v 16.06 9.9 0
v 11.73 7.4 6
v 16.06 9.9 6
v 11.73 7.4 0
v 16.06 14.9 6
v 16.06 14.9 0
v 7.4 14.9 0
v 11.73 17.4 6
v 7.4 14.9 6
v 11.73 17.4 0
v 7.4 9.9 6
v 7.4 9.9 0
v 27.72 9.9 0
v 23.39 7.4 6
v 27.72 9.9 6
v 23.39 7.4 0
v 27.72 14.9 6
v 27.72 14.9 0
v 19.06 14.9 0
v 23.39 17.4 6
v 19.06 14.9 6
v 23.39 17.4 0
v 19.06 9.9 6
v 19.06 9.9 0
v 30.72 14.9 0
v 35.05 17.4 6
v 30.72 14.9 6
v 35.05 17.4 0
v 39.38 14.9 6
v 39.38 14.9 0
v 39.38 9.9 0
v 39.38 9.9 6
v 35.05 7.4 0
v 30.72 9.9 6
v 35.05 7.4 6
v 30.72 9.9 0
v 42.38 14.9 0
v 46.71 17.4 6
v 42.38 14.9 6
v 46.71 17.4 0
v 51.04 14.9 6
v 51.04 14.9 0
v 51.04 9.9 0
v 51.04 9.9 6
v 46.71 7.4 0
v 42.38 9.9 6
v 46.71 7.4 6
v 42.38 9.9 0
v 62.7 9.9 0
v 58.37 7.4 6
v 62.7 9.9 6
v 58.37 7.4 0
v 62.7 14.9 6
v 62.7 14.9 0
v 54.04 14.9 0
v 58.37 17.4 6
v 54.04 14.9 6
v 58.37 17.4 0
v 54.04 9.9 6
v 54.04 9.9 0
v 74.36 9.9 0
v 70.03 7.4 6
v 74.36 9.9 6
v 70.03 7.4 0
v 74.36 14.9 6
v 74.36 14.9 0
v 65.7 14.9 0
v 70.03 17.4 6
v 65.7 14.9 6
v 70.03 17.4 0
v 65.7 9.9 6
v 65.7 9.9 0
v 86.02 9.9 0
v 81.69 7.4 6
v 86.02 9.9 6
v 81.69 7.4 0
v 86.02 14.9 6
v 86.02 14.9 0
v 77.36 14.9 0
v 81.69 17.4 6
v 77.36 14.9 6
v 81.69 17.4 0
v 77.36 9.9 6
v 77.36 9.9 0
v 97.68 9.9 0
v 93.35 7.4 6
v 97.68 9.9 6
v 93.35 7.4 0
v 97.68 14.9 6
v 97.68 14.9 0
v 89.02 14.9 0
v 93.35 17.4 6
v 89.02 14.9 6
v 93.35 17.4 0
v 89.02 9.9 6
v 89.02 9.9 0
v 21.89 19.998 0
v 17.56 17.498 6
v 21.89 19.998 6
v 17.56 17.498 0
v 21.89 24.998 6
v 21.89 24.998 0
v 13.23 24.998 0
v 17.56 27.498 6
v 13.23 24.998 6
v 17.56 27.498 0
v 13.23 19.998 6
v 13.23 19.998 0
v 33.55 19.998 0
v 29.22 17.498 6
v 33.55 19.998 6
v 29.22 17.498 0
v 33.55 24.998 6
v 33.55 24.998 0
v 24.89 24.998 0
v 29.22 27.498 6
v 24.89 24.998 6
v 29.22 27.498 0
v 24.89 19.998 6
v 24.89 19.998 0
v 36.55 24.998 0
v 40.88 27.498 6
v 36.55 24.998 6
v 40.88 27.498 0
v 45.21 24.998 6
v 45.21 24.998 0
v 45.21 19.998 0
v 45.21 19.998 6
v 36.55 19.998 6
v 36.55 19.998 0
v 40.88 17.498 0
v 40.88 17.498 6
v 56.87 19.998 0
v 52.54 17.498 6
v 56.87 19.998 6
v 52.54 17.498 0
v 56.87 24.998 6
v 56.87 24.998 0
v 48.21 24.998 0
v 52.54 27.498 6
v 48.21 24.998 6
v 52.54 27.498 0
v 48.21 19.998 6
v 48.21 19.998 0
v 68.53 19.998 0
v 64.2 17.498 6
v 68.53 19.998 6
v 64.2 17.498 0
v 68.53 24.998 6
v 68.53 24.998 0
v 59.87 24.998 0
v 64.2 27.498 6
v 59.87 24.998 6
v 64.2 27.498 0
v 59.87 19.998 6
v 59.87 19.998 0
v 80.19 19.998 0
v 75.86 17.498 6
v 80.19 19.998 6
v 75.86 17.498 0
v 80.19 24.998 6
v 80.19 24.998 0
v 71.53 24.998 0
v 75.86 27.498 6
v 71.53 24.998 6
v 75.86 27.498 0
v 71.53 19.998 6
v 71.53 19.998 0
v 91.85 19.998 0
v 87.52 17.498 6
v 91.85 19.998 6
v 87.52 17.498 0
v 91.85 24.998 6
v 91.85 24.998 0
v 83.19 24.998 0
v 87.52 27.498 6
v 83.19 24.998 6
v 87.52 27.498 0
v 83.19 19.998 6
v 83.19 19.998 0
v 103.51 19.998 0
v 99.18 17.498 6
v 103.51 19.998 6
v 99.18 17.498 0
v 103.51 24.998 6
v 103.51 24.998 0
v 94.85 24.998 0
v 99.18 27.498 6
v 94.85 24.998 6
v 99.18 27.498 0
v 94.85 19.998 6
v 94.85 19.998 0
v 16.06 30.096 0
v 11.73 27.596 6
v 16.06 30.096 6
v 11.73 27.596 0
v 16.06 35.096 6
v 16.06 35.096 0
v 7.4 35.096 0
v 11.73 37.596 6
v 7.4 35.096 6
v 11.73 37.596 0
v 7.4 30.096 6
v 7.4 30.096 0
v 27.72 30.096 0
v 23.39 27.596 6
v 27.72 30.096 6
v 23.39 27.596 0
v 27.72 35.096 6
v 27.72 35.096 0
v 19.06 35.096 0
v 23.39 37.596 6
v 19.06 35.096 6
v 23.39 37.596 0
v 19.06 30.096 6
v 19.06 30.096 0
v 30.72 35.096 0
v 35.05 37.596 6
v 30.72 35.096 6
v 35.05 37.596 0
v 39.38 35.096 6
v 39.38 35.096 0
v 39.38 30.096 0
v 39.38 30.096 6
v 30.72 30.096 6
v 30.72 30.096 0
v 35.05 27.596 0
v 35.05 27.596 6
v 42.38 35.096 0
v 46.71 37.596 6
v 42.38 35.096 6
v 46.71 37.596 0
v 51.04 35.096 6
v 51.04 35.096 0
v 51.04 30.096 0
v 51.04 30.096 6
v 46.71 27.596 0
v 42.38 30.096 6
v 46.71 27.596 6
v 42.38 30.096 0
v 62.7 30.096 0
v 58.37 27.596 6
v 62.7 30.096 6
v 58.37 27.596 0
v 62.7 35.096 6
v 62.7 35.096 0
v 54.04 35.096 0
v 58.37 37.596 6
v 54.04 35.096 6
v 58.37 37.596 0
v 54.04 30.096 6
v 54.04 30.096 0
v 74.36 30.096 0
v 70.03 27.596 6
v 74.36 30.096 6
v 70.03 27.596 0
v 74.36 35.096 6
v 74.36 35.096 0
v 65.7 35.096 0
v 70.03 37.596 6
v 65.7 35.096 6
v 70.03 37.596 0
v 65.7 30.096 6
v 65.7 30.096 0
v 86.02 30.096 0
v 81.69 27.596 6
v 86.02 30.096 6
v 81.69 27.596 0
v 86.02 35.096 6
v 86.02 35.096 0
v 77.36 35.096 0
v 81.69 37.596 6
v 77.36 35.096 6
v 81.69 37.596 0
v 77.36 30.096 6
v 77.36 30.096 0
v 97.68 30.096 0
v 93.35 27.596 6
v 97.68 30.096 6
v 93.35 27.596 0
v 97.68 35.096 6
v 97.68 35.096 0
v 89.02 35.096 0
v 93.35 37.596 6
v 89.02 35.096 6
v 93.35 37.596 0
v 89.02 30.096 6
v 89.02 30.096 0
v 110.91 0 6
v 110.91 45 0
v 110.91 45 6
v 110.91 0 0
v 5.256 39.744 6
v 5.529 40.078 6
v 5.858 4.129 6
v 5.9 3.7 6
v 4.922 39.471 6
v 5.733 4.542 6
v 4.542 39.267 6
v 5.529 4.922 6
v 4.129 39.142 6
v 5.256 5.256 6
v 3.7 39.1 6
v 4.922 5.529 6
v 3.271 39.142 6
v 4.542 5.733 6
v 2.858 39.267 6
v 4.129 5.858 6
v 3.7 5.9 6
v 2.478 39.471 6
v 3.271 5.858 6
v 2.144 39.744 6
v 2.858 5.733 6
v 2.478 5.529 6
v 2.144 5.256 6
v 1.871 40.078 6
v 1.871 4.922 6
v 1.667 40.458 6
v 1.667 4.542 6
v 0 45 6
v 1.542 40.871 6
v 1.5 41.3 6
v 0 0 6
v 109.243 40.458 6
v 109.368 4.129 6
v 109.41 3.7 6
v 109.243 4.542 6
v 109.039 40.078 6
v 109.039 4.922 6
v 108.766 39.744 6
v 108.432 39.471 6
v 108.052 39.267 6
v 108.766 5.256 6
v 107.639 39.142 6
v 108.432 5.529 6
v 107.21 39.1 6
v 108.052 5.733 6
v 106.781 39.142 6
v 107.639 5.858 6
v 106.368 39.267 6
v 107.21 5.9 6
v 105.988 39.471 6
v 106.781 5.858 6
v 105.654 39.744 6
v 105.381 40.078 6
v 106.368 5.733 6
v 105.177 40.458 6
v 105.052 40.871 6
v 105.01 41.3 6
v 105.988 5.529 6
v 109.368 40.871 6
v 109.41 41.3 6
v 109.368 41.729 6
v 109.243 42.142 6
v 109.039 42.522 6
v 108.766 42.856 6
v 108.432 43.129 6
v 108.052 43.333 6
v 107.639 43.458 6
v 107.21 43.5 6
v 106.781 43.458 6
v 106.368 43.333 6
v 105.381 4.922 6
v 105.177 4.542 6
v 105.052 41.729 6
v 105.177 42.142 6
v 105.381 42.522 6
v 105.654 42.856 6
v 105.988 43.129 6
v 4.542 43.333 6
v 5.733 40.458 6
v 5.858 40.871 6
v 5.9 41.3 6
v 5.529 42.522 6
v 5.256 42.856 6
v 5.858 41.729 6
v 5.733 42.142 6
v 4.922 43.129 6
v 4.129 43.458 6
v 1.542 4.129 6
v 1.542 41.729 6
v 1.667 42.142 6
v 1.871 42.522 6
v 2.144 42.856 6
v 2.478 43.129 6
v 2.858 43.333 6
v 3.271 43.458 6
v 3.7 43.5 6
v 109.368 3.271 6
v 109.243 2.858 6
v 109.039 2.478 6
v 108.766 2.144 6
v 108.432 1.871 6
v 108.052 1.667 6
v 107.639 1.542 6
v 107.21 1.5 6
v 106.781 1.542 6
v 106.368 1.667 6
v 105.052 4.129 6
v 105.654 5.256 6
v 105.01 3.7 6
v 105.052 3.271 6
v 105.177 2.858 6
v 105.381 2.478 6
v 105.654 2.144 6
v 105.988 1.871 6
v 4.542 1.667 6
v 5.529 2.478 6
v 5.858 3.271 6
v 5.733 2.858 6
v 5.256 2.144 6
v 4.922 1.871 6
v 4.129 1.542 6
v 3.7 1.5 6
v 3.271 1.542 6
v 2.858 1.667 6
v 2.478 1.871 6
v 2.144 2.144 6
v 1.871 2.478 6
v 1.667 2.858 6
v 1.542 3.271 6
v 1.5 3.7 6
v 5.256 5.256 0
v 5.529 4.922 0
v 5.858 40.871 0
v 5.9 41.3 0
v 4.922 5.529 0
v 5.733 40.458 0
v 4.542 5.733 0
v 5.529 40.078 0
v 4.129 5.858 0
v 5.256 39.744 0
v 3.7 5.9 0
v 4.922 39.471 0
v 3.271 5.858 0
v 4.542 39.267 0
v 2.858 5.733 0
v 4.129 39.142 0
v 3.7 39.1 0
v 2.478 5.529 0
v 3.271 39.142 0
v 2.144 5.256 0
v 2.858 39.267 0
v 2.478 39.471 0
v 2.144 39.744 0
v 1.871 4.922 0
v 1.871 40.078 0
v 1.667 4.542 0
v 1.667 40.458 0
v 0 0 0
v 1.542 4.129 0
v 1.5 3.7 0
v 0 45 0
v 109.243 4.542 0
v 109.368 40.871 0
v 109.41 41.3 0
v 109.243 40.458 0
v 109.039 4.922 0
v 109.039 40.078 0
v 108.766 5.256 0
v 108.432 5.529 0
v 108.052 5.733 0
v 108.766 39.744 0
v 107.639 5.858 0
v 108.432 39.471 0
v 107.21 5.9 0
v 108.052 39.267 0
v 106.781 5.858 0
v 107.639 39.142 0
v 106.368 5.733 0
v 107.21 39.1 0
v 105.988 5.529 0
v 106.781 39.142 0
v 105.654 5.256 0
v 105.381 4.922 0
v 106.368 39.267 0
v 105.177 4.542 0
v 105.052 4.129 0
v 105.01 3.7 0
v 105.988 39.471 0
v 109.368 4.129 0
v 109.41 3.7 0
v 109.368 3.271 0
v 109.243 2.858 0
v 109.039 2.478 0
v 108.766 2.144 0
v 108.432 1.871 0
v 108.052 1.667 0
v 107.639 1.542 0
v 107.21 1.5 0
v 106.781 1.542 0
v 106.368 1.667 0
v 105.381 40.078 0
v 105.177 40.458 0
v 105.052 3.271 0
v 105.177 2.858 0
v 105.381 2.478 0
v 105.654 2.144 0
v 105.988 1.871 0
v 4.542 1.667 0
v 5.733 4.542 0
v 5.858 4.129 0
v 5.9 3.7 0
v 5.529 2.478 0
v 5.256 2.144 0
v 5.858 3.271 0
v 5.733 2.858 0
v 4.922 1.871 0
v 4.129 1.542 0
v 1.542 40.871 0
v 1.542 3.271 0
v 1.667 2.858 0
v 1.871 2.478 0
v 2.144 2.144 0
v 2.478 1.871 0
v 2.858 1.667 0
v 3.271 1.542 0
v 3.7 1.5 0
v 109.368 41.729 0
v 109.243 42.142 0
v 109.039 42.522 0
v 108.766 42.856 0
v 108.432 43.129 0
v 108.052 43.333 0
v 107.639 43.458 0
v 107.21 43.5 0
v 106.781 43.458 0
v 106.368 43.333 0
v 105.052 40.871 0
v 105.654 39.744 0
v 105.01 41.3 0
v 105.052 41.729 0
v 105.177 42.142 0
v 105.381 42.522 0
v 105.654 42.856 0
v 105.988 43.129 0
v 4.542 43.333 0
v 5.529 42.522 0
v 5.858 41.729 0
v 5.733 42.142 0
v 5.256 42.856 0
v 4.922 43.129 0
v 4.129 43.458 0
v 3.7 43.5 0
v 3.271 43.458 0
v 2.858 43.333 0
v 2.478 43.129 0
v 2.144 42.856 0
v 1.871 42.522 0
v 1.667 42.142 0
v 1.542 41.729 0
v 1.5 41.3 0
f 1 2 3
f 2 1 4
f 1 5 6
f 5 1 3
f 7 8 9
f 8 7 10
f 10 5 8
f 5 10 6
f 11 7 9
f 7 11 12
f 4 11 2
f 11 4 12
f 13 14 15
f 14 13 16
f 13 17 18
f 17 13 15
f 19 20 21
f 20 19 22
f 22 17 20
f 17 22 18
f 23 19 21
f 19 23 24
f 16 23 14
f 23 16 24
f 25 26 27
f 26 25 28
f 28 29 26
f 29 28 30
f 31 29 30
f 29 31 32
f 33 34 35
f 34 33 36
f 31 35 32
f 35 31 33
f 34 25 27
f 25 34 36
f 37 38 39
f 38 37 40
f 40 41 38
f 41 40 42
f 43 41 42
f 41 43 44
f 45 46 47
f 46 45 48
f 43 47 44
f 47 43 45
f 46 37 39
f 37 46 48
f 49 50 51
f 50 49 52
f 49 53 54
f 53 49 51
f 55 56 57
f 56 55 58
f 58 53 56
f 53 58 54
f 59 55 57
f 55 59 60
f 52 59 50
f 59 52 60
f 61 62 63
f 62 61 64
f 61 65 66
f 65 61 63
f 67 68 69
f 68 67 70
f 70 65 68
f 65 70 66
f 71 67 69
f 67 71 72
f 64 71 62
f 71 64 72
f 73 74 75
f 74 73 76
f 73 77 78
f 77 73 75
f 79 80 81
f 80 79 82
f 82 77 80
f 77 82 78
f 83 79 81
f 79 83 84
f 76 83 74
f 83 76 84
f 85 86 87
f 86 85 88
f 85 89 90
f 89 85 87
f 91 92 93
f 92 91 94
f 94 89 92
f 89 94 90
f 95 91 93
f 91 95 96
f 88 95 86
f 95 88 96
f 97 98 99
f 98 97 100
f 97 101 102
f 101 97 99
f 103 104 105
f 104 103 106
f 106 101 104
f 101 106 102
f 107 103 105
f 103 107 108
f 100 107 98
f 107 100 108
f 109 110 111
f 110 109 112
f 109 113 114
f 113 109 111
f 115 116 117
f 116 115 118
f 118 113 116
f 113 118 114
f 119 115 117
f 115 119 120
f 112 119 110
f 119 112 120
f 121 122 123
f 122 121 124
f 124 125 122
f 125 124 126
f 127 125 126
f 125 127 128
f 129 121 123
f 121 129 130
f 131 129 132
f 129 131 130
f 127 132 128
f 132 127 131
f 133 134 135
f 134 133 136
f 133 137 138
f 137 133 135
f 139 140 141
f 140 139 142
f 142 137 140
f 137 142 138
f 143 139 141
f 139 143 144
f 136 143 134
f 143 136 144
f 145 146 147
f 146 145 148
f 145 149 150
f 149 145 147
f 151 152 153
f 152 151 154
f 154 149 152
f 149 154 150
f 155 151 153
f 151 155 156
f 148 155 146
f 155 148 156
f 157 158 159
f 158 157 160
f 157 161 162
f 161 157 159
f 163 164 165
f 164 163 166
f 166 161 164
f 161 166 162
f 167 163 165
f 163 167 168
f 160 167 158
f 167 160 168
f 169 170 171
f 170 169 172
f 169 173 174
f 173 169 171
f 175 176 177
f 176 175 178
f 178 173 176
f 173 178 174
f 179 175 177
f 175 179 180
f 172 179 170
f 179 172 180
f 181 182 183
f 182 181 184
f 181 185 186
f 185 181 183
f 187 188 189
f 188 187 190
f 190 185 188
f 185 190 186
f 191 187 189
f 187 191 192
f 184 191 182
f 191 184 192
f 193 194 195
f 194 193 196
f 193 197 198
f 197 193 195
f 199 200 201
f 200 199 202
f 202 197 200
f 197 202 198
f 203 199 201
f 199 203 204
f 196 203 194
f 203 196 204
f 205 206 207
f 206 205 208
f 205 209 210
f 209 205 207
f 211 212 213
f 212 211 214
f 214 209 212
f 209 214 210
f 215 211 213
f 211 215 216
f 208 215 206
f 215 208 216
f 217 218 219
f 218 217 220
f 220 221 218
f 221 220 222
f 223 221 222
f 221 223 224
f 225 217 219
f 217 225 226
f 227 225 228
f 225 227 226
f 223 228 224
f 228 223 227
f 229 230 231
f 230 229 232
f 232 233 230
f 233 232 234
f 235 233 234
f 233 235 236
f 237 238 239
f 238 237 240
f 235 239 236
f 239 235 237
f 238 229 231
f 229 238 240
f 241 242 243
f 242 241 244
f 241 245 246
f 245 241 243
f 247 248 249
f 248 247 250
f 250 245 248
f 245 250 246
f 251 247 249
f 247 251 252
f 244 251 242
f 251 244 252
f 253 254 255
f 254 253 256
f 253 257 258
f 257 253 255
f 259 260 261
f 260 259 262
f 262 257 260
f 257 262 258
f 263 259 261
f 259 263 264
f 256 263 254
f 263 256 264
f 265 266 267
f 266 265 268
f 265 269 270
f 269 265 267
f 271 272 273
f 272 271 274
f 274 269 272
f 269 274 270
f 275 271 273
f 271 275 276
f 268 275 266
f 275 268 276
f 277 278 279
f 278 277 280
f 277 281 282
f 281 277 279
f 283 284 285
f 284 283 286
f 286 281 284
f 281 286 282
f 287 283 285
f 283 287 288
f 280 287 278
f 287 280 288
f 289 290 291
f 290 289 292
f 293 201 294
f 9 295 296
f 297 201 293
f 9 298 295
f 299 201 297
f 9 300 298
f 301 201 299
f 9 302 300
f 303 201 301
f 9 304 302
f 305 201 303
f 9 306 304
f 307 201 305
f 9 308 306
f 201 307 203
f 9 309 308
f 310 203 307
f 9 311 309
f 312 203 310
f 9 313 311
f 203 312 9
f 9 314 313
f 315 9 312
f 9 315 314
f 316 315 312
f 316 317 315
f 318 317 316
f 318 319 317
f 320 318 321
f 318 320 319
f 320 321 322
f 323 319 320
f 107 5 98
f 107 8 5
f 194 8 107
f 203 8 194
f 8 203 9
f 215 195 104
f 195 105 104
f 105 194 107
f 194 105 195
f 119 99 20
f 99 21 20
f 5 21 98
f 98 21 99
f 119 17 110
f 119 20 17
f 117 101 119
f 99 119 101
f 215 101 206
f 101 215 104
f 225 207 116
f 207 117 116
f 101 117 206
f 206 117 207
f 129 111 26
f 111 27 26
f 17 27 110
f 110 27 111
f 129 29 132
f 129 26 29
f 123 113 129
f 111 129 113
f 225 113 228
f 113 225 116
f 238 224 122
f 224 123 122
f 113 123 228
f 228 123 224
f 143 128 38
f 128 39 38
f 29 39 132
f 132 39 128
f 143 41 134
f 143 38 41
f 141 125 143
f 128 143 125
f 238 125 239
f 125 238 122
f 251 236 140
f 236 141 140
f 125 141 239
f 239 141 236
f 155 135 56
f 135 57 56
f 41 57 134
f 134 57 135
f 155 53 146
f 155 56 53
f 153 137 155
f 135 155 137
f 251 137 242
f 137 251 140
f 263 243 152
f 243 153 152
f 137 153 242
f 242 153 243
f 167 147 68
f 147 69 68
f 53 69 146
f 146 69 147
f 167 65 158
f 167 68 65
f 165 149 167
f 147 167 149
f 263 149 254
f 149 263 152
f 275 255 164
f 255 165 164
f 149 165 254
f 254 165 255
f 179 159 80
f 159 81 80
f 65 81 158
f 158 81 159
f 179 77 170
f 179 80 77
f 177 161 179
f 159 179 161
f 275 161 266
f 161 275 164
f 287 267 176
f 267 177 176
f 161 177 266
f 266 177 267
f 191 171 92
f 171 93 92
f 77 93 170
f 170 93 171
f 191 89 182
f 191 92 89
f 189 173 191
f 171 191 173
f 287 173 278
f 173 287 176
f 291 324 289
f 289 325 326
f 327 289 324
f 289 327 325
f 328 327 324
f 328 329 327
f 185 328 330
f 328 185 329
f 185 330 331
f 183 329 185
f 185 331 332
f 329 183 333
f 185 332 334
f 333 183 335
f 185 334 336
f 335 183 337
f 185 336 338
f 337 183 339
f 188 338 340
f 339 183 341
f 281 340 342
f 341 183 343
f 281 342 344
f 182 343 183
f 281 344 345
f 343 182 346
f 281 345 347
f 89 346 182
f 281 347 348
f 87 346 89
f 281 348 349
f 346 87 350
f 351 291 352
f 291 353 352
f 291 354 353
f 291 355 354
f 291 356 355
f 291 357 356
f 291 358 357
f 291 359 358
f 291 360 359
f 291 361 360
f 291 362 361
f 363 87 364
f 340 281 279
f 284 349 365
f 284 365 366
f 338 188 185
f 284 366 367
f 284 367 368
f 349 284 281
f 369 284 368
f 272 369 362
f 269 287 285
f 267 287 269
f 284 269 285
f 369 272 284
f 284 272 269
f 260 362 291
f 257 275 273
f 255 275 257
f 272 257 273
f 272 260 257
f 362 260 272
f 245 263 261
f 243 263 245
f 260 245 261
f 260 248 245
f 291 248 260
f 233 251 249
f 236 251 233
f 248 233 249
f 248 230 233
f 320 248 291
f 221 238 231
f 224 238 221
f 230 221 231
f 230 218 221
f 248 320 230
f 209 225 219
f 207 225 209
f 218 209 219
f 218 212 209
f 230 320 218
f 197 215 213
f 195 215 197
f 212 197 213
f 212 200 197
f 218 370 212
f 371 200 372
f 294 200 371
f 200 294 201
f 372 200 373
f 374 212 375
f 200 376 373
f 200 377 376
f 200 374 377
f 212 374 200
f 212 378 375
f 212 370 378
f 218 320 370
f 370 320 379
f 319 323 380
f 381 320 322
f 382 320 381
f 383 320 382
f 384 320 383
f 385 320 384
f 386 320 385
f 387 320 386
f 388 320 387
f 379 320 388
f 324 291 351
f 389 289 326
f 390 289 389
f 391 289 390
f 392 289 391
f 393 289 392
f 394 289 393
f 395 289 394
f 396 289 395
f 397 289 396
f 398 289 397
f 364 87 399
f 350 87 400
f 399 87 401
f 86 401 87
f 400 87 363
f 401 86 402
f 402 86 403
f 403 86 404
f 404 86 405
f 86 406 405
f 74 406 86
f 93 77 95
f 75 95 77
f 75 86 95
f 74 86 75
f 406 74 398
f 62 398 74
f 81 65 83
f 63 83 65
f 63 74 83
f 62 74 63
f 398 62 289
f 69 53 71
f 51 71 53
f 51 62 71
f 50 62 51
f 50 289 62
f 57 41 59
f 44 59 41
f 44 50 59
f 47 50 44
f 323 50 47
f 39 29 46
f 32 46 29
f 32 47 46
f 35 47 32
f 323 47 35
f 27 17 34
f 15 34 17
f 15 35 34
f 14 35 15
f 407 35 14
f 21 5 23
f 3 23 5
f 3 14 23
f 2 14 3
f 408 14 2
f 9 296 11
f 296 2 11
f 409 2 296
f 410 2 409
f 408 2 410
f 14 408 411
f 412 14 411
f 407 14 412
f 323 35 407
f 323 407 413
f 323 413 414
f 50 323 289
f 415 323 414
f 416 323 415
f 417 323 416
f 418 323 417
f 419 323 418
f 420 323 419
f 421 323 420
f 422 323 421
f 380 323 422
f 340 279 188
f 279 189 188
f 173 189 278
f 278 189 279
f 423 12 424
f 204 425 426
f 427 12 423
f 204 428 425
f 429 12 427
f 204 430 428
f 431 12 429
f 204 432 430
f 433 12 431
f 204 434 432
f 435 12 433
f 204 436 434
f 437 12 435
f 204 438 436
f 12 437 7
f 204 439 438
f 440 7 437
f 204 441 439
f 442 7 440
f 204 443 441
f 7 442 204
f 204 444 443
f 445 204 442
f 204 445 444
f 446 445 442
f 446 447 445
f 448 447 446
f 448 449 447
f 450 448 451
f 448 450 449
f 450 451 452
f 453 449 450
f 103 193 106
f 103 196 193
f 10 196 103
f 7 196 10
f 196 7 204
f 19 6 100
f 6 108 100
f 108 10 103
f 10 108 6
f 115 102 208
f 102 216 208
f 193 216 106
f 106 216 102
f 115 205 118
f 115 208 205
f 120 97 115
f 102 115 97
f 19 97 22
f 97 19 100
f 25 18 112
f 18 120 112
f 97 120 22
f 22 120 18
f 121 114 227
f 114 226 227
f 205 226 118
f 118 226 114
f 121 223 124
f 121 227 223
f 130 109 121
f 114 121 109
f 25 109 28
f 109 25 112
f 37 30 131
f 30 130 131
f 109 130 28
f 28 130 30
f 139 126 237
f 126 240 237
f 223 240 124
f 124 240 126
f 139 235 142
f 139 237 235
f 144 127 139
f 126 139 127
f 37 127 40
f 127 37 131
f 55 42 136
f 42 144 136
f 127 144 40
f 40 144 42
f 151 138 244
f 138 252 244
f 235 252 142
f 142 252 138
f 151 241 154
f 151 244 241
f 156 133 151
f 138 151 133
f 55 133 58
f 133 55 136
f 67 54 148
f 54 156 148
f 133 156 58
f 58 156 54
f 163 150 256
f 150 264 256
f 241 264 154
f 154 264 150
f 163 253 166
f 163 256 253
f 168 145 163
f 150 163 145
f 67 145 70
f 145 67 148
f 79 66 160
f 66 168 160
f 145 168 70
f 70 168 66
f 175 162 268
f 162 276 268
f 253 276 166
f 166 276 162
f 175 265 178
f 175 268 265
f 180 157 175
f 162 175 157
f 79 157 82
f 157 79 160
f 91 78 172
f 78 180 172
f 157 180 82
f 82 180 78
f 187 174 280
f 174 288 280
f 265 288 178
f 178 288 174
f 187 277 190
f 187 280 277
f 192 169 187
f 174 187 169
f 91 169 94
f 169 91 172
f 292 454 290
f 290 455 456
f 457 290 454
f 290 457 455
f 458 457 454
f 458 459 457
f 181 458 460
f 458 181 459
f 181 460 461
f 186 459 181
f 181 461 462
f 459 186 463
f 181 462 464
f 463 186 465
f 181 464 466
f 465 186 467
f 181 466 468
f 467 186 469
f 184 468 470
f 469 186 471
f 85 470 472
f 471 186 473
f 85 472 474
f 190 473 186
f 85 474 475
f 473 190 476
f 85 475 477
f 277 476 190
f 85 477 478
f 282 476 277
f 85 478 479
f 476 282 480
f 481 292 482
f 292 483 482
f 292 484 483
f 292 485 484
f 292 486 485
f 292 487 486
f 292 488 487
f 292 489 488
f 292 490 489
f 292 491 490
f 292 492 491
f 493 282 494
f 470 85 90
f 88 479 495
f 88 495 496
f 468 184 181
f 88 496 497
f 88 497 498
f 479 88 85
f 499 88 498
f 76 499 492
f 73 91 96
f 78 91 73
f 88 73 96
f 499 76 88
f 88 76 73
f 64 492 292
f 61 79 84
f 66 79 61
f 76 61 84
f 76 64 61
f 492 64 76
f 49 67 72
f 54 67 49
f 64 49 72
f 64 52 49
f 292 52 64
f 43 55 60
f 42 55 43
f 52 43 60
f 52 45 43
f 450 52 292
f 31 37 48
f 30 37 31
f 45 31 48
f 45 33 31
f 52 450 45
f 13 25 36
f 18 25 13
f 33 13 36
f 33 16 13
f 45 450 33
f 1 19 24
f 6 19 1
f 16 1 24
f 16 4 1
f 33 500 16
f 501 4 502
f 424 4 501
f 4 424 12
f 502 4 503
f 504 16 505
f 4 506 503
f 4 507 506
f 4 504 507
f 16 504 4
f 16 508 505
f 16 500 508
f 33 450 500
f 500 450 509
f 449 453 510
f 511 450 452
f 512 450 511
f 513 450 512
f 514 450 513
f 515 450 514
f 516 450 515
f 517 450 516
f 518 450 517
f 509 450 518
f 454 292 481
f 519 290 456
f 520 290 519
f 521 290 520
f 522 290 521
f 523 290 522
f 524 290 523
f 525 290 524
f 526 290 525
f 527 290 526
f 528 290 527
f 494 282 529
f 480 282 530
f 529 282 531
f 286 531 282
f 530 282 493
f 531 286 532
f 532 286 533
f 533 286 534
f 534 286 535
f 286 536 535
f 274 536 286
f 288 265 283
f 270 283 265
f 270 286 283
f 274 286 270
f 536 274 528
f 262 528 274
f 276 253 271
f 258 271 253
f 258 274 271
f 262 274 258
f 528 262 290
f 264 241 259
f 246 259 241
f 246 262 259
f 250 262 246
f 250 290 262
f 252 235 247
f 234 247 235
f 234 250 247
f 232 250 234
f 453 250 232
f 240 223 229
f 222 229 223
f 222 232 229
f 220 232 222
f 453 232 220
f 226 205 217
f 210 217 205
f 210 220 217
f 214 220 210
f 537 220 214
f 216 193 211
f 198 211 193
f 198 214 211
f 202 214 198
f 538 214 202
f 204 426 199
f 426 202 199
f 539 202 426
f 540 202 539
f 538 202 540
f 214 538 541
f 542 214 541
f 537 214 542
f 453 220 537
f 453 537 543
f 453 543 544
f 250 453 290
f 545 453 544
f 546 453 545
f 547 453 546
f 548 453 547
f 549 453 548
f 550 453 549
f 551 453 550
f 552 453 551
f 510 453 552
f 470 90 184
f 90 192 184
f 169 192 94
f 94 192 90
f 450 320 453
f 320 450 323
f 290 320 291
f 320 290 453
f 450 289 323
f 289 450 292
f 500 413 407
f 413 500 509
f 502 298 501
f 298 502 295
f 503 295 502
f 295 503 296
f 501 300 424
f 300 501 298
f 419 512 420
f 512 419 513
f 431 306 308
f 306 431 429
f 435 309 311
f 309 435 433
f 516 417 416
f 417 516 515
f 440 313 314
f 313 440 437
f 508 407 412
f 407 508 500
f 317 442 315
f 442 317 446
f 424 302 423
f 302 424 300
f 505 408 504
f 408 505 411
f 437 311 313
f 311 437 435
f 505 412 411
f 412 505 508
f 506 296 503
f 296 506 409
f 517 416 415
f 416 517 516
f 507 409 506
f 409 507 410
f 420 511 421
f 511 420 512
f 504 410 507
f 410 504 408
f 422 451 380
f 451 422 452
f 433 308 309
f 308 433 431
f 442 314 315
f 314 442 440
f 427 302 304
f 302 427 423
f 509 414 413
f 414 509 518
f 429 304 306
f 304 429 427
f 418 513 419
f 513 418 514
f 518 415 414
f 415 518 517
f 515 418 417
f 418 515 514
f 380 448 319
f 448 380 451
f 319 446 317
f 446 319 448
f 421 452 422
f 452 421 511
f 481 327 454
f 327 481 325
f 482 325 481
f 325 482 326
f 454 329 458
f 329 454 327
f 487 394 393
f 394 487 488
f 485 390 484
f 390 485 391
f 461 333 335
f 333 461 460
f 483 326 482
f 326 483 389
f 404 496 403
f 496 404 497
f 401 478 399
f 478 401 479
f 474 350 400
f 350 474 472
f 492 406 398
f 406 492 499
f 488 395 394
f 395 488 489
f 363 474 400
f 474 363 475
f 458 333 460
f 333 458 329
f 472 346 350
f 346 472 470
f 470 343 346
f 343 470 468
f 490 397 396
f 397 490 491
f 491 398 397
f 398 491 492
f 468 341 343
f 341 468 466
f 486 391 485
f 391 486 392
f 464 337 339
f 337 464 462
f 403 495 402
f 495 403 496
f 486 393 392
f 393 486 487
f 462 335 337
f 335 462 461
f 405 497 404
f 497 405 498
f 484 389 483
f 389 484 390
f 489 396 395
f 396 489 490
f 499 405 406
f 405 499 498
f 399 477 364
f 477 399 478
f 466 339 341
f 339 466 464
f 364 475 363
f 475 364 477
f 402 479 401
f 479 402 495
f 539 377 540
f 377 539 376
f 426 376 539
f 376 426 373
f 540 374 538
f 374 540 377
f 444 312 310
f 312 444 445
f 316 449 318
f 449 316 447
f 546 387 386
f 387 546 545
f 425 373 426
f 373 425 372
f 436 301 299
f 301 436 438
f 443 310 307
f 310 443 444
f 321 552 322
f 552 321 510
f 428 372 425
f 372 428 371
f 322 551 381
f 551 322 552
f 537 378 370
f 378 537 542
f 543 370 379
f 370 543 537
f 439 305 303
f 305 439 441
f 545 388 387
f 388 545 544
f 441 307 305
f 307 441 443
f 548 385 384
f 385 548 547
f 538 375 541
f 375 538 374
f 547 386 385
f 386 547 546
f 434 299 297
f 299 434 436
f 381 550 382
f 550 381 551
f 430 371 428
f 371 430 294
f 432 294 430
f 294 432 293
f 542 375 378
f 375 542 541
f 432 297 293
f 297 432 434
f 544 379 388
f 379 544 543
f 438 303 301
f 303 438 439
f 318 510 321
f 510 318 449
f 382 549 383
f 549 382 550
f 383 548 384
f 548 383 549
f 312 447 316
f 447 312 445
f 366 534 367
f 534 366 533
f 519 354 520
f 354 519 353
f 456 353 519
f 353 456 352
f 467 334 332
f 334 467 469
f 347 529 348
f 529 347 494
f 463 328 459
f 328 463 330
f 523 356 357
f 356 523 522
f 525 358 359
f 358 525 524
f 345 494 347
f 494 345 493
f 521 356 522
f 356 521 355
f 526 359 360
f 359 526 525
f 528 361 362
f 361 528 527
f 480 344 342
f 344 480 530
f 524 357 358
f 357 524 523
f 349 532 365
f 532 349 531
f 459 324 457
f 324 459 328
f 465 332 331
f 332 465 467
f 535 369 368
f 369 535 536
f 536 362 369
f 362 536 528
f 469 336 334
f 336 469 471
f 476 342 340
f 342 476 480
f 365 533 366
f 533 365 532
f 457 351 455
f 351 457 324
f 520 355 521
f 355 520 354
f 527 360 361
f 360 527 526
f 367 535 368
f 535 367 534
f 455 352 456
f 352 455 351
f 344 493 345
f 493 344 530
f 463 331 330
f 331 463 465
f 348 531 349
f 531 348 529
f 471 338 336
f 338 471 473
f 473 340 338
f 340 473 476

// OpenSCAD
$fn = 32;

// ----------------------------------------------------------------------
// Honeycomb panel: 110.91 x 45 mm, 24 cells of 10 mm
// ----------------------------------------------------------------------

// --- parameters (mm) ---
panel_w = 110.91;         // panel width
panel_d = 45;             // panel depth
thick = 6;                // panel thickness
cell_r = 5;               // hex cell circumradius
pitch = 11.66;            // hex cell pitch (centre to centre)
web = 3;                  // web between the cells
columns = 8;              // columns of cells
rows = 3;                 // rows of cells
cell_count = 24;          // total cells
shift_x = 11.73;          // first cell offset in x
shift_y = 12.4;           // first cell offset in y
mount_d = 4.4;            // corner mounting holes
hole_off = 3.7;           // mounting hole offset from the corners

difference() {
  union() {
    cube([panel_w, panel_d, thick]);
  }
  /* hexagonal cells, point-up, cut right through the plate */
  for (row = [0 : rows - 1]) {
    for (col = [0 : columns - 1]) {
      translate([shift_x + col * pitch + (row % 2) * pitch / 2, shift_y + row * pitch * 0.866025, -2.5]) rotate([0, 0, 30]) cylinder(h = thick + 5, d = 2 * cell_r, $fn = 6);
    }
  }
  /* corner mounting holes, clear of the outer cell web */
  translate([3.7, 3.7, -2.5]) cylinder(h = thick + 5, d = mount_d);
  translate([107.21, 3.7, -2.5]) cylinder(h = thick + 5, d = mount_d);
  translate([3.7, 41.3, -2.5]) cylinder(h = thick + 5, d = mount_d);
  translate([107.21, 41.3, -2.5]) cylinder(h = thick + 5, d = mount_d);
}
